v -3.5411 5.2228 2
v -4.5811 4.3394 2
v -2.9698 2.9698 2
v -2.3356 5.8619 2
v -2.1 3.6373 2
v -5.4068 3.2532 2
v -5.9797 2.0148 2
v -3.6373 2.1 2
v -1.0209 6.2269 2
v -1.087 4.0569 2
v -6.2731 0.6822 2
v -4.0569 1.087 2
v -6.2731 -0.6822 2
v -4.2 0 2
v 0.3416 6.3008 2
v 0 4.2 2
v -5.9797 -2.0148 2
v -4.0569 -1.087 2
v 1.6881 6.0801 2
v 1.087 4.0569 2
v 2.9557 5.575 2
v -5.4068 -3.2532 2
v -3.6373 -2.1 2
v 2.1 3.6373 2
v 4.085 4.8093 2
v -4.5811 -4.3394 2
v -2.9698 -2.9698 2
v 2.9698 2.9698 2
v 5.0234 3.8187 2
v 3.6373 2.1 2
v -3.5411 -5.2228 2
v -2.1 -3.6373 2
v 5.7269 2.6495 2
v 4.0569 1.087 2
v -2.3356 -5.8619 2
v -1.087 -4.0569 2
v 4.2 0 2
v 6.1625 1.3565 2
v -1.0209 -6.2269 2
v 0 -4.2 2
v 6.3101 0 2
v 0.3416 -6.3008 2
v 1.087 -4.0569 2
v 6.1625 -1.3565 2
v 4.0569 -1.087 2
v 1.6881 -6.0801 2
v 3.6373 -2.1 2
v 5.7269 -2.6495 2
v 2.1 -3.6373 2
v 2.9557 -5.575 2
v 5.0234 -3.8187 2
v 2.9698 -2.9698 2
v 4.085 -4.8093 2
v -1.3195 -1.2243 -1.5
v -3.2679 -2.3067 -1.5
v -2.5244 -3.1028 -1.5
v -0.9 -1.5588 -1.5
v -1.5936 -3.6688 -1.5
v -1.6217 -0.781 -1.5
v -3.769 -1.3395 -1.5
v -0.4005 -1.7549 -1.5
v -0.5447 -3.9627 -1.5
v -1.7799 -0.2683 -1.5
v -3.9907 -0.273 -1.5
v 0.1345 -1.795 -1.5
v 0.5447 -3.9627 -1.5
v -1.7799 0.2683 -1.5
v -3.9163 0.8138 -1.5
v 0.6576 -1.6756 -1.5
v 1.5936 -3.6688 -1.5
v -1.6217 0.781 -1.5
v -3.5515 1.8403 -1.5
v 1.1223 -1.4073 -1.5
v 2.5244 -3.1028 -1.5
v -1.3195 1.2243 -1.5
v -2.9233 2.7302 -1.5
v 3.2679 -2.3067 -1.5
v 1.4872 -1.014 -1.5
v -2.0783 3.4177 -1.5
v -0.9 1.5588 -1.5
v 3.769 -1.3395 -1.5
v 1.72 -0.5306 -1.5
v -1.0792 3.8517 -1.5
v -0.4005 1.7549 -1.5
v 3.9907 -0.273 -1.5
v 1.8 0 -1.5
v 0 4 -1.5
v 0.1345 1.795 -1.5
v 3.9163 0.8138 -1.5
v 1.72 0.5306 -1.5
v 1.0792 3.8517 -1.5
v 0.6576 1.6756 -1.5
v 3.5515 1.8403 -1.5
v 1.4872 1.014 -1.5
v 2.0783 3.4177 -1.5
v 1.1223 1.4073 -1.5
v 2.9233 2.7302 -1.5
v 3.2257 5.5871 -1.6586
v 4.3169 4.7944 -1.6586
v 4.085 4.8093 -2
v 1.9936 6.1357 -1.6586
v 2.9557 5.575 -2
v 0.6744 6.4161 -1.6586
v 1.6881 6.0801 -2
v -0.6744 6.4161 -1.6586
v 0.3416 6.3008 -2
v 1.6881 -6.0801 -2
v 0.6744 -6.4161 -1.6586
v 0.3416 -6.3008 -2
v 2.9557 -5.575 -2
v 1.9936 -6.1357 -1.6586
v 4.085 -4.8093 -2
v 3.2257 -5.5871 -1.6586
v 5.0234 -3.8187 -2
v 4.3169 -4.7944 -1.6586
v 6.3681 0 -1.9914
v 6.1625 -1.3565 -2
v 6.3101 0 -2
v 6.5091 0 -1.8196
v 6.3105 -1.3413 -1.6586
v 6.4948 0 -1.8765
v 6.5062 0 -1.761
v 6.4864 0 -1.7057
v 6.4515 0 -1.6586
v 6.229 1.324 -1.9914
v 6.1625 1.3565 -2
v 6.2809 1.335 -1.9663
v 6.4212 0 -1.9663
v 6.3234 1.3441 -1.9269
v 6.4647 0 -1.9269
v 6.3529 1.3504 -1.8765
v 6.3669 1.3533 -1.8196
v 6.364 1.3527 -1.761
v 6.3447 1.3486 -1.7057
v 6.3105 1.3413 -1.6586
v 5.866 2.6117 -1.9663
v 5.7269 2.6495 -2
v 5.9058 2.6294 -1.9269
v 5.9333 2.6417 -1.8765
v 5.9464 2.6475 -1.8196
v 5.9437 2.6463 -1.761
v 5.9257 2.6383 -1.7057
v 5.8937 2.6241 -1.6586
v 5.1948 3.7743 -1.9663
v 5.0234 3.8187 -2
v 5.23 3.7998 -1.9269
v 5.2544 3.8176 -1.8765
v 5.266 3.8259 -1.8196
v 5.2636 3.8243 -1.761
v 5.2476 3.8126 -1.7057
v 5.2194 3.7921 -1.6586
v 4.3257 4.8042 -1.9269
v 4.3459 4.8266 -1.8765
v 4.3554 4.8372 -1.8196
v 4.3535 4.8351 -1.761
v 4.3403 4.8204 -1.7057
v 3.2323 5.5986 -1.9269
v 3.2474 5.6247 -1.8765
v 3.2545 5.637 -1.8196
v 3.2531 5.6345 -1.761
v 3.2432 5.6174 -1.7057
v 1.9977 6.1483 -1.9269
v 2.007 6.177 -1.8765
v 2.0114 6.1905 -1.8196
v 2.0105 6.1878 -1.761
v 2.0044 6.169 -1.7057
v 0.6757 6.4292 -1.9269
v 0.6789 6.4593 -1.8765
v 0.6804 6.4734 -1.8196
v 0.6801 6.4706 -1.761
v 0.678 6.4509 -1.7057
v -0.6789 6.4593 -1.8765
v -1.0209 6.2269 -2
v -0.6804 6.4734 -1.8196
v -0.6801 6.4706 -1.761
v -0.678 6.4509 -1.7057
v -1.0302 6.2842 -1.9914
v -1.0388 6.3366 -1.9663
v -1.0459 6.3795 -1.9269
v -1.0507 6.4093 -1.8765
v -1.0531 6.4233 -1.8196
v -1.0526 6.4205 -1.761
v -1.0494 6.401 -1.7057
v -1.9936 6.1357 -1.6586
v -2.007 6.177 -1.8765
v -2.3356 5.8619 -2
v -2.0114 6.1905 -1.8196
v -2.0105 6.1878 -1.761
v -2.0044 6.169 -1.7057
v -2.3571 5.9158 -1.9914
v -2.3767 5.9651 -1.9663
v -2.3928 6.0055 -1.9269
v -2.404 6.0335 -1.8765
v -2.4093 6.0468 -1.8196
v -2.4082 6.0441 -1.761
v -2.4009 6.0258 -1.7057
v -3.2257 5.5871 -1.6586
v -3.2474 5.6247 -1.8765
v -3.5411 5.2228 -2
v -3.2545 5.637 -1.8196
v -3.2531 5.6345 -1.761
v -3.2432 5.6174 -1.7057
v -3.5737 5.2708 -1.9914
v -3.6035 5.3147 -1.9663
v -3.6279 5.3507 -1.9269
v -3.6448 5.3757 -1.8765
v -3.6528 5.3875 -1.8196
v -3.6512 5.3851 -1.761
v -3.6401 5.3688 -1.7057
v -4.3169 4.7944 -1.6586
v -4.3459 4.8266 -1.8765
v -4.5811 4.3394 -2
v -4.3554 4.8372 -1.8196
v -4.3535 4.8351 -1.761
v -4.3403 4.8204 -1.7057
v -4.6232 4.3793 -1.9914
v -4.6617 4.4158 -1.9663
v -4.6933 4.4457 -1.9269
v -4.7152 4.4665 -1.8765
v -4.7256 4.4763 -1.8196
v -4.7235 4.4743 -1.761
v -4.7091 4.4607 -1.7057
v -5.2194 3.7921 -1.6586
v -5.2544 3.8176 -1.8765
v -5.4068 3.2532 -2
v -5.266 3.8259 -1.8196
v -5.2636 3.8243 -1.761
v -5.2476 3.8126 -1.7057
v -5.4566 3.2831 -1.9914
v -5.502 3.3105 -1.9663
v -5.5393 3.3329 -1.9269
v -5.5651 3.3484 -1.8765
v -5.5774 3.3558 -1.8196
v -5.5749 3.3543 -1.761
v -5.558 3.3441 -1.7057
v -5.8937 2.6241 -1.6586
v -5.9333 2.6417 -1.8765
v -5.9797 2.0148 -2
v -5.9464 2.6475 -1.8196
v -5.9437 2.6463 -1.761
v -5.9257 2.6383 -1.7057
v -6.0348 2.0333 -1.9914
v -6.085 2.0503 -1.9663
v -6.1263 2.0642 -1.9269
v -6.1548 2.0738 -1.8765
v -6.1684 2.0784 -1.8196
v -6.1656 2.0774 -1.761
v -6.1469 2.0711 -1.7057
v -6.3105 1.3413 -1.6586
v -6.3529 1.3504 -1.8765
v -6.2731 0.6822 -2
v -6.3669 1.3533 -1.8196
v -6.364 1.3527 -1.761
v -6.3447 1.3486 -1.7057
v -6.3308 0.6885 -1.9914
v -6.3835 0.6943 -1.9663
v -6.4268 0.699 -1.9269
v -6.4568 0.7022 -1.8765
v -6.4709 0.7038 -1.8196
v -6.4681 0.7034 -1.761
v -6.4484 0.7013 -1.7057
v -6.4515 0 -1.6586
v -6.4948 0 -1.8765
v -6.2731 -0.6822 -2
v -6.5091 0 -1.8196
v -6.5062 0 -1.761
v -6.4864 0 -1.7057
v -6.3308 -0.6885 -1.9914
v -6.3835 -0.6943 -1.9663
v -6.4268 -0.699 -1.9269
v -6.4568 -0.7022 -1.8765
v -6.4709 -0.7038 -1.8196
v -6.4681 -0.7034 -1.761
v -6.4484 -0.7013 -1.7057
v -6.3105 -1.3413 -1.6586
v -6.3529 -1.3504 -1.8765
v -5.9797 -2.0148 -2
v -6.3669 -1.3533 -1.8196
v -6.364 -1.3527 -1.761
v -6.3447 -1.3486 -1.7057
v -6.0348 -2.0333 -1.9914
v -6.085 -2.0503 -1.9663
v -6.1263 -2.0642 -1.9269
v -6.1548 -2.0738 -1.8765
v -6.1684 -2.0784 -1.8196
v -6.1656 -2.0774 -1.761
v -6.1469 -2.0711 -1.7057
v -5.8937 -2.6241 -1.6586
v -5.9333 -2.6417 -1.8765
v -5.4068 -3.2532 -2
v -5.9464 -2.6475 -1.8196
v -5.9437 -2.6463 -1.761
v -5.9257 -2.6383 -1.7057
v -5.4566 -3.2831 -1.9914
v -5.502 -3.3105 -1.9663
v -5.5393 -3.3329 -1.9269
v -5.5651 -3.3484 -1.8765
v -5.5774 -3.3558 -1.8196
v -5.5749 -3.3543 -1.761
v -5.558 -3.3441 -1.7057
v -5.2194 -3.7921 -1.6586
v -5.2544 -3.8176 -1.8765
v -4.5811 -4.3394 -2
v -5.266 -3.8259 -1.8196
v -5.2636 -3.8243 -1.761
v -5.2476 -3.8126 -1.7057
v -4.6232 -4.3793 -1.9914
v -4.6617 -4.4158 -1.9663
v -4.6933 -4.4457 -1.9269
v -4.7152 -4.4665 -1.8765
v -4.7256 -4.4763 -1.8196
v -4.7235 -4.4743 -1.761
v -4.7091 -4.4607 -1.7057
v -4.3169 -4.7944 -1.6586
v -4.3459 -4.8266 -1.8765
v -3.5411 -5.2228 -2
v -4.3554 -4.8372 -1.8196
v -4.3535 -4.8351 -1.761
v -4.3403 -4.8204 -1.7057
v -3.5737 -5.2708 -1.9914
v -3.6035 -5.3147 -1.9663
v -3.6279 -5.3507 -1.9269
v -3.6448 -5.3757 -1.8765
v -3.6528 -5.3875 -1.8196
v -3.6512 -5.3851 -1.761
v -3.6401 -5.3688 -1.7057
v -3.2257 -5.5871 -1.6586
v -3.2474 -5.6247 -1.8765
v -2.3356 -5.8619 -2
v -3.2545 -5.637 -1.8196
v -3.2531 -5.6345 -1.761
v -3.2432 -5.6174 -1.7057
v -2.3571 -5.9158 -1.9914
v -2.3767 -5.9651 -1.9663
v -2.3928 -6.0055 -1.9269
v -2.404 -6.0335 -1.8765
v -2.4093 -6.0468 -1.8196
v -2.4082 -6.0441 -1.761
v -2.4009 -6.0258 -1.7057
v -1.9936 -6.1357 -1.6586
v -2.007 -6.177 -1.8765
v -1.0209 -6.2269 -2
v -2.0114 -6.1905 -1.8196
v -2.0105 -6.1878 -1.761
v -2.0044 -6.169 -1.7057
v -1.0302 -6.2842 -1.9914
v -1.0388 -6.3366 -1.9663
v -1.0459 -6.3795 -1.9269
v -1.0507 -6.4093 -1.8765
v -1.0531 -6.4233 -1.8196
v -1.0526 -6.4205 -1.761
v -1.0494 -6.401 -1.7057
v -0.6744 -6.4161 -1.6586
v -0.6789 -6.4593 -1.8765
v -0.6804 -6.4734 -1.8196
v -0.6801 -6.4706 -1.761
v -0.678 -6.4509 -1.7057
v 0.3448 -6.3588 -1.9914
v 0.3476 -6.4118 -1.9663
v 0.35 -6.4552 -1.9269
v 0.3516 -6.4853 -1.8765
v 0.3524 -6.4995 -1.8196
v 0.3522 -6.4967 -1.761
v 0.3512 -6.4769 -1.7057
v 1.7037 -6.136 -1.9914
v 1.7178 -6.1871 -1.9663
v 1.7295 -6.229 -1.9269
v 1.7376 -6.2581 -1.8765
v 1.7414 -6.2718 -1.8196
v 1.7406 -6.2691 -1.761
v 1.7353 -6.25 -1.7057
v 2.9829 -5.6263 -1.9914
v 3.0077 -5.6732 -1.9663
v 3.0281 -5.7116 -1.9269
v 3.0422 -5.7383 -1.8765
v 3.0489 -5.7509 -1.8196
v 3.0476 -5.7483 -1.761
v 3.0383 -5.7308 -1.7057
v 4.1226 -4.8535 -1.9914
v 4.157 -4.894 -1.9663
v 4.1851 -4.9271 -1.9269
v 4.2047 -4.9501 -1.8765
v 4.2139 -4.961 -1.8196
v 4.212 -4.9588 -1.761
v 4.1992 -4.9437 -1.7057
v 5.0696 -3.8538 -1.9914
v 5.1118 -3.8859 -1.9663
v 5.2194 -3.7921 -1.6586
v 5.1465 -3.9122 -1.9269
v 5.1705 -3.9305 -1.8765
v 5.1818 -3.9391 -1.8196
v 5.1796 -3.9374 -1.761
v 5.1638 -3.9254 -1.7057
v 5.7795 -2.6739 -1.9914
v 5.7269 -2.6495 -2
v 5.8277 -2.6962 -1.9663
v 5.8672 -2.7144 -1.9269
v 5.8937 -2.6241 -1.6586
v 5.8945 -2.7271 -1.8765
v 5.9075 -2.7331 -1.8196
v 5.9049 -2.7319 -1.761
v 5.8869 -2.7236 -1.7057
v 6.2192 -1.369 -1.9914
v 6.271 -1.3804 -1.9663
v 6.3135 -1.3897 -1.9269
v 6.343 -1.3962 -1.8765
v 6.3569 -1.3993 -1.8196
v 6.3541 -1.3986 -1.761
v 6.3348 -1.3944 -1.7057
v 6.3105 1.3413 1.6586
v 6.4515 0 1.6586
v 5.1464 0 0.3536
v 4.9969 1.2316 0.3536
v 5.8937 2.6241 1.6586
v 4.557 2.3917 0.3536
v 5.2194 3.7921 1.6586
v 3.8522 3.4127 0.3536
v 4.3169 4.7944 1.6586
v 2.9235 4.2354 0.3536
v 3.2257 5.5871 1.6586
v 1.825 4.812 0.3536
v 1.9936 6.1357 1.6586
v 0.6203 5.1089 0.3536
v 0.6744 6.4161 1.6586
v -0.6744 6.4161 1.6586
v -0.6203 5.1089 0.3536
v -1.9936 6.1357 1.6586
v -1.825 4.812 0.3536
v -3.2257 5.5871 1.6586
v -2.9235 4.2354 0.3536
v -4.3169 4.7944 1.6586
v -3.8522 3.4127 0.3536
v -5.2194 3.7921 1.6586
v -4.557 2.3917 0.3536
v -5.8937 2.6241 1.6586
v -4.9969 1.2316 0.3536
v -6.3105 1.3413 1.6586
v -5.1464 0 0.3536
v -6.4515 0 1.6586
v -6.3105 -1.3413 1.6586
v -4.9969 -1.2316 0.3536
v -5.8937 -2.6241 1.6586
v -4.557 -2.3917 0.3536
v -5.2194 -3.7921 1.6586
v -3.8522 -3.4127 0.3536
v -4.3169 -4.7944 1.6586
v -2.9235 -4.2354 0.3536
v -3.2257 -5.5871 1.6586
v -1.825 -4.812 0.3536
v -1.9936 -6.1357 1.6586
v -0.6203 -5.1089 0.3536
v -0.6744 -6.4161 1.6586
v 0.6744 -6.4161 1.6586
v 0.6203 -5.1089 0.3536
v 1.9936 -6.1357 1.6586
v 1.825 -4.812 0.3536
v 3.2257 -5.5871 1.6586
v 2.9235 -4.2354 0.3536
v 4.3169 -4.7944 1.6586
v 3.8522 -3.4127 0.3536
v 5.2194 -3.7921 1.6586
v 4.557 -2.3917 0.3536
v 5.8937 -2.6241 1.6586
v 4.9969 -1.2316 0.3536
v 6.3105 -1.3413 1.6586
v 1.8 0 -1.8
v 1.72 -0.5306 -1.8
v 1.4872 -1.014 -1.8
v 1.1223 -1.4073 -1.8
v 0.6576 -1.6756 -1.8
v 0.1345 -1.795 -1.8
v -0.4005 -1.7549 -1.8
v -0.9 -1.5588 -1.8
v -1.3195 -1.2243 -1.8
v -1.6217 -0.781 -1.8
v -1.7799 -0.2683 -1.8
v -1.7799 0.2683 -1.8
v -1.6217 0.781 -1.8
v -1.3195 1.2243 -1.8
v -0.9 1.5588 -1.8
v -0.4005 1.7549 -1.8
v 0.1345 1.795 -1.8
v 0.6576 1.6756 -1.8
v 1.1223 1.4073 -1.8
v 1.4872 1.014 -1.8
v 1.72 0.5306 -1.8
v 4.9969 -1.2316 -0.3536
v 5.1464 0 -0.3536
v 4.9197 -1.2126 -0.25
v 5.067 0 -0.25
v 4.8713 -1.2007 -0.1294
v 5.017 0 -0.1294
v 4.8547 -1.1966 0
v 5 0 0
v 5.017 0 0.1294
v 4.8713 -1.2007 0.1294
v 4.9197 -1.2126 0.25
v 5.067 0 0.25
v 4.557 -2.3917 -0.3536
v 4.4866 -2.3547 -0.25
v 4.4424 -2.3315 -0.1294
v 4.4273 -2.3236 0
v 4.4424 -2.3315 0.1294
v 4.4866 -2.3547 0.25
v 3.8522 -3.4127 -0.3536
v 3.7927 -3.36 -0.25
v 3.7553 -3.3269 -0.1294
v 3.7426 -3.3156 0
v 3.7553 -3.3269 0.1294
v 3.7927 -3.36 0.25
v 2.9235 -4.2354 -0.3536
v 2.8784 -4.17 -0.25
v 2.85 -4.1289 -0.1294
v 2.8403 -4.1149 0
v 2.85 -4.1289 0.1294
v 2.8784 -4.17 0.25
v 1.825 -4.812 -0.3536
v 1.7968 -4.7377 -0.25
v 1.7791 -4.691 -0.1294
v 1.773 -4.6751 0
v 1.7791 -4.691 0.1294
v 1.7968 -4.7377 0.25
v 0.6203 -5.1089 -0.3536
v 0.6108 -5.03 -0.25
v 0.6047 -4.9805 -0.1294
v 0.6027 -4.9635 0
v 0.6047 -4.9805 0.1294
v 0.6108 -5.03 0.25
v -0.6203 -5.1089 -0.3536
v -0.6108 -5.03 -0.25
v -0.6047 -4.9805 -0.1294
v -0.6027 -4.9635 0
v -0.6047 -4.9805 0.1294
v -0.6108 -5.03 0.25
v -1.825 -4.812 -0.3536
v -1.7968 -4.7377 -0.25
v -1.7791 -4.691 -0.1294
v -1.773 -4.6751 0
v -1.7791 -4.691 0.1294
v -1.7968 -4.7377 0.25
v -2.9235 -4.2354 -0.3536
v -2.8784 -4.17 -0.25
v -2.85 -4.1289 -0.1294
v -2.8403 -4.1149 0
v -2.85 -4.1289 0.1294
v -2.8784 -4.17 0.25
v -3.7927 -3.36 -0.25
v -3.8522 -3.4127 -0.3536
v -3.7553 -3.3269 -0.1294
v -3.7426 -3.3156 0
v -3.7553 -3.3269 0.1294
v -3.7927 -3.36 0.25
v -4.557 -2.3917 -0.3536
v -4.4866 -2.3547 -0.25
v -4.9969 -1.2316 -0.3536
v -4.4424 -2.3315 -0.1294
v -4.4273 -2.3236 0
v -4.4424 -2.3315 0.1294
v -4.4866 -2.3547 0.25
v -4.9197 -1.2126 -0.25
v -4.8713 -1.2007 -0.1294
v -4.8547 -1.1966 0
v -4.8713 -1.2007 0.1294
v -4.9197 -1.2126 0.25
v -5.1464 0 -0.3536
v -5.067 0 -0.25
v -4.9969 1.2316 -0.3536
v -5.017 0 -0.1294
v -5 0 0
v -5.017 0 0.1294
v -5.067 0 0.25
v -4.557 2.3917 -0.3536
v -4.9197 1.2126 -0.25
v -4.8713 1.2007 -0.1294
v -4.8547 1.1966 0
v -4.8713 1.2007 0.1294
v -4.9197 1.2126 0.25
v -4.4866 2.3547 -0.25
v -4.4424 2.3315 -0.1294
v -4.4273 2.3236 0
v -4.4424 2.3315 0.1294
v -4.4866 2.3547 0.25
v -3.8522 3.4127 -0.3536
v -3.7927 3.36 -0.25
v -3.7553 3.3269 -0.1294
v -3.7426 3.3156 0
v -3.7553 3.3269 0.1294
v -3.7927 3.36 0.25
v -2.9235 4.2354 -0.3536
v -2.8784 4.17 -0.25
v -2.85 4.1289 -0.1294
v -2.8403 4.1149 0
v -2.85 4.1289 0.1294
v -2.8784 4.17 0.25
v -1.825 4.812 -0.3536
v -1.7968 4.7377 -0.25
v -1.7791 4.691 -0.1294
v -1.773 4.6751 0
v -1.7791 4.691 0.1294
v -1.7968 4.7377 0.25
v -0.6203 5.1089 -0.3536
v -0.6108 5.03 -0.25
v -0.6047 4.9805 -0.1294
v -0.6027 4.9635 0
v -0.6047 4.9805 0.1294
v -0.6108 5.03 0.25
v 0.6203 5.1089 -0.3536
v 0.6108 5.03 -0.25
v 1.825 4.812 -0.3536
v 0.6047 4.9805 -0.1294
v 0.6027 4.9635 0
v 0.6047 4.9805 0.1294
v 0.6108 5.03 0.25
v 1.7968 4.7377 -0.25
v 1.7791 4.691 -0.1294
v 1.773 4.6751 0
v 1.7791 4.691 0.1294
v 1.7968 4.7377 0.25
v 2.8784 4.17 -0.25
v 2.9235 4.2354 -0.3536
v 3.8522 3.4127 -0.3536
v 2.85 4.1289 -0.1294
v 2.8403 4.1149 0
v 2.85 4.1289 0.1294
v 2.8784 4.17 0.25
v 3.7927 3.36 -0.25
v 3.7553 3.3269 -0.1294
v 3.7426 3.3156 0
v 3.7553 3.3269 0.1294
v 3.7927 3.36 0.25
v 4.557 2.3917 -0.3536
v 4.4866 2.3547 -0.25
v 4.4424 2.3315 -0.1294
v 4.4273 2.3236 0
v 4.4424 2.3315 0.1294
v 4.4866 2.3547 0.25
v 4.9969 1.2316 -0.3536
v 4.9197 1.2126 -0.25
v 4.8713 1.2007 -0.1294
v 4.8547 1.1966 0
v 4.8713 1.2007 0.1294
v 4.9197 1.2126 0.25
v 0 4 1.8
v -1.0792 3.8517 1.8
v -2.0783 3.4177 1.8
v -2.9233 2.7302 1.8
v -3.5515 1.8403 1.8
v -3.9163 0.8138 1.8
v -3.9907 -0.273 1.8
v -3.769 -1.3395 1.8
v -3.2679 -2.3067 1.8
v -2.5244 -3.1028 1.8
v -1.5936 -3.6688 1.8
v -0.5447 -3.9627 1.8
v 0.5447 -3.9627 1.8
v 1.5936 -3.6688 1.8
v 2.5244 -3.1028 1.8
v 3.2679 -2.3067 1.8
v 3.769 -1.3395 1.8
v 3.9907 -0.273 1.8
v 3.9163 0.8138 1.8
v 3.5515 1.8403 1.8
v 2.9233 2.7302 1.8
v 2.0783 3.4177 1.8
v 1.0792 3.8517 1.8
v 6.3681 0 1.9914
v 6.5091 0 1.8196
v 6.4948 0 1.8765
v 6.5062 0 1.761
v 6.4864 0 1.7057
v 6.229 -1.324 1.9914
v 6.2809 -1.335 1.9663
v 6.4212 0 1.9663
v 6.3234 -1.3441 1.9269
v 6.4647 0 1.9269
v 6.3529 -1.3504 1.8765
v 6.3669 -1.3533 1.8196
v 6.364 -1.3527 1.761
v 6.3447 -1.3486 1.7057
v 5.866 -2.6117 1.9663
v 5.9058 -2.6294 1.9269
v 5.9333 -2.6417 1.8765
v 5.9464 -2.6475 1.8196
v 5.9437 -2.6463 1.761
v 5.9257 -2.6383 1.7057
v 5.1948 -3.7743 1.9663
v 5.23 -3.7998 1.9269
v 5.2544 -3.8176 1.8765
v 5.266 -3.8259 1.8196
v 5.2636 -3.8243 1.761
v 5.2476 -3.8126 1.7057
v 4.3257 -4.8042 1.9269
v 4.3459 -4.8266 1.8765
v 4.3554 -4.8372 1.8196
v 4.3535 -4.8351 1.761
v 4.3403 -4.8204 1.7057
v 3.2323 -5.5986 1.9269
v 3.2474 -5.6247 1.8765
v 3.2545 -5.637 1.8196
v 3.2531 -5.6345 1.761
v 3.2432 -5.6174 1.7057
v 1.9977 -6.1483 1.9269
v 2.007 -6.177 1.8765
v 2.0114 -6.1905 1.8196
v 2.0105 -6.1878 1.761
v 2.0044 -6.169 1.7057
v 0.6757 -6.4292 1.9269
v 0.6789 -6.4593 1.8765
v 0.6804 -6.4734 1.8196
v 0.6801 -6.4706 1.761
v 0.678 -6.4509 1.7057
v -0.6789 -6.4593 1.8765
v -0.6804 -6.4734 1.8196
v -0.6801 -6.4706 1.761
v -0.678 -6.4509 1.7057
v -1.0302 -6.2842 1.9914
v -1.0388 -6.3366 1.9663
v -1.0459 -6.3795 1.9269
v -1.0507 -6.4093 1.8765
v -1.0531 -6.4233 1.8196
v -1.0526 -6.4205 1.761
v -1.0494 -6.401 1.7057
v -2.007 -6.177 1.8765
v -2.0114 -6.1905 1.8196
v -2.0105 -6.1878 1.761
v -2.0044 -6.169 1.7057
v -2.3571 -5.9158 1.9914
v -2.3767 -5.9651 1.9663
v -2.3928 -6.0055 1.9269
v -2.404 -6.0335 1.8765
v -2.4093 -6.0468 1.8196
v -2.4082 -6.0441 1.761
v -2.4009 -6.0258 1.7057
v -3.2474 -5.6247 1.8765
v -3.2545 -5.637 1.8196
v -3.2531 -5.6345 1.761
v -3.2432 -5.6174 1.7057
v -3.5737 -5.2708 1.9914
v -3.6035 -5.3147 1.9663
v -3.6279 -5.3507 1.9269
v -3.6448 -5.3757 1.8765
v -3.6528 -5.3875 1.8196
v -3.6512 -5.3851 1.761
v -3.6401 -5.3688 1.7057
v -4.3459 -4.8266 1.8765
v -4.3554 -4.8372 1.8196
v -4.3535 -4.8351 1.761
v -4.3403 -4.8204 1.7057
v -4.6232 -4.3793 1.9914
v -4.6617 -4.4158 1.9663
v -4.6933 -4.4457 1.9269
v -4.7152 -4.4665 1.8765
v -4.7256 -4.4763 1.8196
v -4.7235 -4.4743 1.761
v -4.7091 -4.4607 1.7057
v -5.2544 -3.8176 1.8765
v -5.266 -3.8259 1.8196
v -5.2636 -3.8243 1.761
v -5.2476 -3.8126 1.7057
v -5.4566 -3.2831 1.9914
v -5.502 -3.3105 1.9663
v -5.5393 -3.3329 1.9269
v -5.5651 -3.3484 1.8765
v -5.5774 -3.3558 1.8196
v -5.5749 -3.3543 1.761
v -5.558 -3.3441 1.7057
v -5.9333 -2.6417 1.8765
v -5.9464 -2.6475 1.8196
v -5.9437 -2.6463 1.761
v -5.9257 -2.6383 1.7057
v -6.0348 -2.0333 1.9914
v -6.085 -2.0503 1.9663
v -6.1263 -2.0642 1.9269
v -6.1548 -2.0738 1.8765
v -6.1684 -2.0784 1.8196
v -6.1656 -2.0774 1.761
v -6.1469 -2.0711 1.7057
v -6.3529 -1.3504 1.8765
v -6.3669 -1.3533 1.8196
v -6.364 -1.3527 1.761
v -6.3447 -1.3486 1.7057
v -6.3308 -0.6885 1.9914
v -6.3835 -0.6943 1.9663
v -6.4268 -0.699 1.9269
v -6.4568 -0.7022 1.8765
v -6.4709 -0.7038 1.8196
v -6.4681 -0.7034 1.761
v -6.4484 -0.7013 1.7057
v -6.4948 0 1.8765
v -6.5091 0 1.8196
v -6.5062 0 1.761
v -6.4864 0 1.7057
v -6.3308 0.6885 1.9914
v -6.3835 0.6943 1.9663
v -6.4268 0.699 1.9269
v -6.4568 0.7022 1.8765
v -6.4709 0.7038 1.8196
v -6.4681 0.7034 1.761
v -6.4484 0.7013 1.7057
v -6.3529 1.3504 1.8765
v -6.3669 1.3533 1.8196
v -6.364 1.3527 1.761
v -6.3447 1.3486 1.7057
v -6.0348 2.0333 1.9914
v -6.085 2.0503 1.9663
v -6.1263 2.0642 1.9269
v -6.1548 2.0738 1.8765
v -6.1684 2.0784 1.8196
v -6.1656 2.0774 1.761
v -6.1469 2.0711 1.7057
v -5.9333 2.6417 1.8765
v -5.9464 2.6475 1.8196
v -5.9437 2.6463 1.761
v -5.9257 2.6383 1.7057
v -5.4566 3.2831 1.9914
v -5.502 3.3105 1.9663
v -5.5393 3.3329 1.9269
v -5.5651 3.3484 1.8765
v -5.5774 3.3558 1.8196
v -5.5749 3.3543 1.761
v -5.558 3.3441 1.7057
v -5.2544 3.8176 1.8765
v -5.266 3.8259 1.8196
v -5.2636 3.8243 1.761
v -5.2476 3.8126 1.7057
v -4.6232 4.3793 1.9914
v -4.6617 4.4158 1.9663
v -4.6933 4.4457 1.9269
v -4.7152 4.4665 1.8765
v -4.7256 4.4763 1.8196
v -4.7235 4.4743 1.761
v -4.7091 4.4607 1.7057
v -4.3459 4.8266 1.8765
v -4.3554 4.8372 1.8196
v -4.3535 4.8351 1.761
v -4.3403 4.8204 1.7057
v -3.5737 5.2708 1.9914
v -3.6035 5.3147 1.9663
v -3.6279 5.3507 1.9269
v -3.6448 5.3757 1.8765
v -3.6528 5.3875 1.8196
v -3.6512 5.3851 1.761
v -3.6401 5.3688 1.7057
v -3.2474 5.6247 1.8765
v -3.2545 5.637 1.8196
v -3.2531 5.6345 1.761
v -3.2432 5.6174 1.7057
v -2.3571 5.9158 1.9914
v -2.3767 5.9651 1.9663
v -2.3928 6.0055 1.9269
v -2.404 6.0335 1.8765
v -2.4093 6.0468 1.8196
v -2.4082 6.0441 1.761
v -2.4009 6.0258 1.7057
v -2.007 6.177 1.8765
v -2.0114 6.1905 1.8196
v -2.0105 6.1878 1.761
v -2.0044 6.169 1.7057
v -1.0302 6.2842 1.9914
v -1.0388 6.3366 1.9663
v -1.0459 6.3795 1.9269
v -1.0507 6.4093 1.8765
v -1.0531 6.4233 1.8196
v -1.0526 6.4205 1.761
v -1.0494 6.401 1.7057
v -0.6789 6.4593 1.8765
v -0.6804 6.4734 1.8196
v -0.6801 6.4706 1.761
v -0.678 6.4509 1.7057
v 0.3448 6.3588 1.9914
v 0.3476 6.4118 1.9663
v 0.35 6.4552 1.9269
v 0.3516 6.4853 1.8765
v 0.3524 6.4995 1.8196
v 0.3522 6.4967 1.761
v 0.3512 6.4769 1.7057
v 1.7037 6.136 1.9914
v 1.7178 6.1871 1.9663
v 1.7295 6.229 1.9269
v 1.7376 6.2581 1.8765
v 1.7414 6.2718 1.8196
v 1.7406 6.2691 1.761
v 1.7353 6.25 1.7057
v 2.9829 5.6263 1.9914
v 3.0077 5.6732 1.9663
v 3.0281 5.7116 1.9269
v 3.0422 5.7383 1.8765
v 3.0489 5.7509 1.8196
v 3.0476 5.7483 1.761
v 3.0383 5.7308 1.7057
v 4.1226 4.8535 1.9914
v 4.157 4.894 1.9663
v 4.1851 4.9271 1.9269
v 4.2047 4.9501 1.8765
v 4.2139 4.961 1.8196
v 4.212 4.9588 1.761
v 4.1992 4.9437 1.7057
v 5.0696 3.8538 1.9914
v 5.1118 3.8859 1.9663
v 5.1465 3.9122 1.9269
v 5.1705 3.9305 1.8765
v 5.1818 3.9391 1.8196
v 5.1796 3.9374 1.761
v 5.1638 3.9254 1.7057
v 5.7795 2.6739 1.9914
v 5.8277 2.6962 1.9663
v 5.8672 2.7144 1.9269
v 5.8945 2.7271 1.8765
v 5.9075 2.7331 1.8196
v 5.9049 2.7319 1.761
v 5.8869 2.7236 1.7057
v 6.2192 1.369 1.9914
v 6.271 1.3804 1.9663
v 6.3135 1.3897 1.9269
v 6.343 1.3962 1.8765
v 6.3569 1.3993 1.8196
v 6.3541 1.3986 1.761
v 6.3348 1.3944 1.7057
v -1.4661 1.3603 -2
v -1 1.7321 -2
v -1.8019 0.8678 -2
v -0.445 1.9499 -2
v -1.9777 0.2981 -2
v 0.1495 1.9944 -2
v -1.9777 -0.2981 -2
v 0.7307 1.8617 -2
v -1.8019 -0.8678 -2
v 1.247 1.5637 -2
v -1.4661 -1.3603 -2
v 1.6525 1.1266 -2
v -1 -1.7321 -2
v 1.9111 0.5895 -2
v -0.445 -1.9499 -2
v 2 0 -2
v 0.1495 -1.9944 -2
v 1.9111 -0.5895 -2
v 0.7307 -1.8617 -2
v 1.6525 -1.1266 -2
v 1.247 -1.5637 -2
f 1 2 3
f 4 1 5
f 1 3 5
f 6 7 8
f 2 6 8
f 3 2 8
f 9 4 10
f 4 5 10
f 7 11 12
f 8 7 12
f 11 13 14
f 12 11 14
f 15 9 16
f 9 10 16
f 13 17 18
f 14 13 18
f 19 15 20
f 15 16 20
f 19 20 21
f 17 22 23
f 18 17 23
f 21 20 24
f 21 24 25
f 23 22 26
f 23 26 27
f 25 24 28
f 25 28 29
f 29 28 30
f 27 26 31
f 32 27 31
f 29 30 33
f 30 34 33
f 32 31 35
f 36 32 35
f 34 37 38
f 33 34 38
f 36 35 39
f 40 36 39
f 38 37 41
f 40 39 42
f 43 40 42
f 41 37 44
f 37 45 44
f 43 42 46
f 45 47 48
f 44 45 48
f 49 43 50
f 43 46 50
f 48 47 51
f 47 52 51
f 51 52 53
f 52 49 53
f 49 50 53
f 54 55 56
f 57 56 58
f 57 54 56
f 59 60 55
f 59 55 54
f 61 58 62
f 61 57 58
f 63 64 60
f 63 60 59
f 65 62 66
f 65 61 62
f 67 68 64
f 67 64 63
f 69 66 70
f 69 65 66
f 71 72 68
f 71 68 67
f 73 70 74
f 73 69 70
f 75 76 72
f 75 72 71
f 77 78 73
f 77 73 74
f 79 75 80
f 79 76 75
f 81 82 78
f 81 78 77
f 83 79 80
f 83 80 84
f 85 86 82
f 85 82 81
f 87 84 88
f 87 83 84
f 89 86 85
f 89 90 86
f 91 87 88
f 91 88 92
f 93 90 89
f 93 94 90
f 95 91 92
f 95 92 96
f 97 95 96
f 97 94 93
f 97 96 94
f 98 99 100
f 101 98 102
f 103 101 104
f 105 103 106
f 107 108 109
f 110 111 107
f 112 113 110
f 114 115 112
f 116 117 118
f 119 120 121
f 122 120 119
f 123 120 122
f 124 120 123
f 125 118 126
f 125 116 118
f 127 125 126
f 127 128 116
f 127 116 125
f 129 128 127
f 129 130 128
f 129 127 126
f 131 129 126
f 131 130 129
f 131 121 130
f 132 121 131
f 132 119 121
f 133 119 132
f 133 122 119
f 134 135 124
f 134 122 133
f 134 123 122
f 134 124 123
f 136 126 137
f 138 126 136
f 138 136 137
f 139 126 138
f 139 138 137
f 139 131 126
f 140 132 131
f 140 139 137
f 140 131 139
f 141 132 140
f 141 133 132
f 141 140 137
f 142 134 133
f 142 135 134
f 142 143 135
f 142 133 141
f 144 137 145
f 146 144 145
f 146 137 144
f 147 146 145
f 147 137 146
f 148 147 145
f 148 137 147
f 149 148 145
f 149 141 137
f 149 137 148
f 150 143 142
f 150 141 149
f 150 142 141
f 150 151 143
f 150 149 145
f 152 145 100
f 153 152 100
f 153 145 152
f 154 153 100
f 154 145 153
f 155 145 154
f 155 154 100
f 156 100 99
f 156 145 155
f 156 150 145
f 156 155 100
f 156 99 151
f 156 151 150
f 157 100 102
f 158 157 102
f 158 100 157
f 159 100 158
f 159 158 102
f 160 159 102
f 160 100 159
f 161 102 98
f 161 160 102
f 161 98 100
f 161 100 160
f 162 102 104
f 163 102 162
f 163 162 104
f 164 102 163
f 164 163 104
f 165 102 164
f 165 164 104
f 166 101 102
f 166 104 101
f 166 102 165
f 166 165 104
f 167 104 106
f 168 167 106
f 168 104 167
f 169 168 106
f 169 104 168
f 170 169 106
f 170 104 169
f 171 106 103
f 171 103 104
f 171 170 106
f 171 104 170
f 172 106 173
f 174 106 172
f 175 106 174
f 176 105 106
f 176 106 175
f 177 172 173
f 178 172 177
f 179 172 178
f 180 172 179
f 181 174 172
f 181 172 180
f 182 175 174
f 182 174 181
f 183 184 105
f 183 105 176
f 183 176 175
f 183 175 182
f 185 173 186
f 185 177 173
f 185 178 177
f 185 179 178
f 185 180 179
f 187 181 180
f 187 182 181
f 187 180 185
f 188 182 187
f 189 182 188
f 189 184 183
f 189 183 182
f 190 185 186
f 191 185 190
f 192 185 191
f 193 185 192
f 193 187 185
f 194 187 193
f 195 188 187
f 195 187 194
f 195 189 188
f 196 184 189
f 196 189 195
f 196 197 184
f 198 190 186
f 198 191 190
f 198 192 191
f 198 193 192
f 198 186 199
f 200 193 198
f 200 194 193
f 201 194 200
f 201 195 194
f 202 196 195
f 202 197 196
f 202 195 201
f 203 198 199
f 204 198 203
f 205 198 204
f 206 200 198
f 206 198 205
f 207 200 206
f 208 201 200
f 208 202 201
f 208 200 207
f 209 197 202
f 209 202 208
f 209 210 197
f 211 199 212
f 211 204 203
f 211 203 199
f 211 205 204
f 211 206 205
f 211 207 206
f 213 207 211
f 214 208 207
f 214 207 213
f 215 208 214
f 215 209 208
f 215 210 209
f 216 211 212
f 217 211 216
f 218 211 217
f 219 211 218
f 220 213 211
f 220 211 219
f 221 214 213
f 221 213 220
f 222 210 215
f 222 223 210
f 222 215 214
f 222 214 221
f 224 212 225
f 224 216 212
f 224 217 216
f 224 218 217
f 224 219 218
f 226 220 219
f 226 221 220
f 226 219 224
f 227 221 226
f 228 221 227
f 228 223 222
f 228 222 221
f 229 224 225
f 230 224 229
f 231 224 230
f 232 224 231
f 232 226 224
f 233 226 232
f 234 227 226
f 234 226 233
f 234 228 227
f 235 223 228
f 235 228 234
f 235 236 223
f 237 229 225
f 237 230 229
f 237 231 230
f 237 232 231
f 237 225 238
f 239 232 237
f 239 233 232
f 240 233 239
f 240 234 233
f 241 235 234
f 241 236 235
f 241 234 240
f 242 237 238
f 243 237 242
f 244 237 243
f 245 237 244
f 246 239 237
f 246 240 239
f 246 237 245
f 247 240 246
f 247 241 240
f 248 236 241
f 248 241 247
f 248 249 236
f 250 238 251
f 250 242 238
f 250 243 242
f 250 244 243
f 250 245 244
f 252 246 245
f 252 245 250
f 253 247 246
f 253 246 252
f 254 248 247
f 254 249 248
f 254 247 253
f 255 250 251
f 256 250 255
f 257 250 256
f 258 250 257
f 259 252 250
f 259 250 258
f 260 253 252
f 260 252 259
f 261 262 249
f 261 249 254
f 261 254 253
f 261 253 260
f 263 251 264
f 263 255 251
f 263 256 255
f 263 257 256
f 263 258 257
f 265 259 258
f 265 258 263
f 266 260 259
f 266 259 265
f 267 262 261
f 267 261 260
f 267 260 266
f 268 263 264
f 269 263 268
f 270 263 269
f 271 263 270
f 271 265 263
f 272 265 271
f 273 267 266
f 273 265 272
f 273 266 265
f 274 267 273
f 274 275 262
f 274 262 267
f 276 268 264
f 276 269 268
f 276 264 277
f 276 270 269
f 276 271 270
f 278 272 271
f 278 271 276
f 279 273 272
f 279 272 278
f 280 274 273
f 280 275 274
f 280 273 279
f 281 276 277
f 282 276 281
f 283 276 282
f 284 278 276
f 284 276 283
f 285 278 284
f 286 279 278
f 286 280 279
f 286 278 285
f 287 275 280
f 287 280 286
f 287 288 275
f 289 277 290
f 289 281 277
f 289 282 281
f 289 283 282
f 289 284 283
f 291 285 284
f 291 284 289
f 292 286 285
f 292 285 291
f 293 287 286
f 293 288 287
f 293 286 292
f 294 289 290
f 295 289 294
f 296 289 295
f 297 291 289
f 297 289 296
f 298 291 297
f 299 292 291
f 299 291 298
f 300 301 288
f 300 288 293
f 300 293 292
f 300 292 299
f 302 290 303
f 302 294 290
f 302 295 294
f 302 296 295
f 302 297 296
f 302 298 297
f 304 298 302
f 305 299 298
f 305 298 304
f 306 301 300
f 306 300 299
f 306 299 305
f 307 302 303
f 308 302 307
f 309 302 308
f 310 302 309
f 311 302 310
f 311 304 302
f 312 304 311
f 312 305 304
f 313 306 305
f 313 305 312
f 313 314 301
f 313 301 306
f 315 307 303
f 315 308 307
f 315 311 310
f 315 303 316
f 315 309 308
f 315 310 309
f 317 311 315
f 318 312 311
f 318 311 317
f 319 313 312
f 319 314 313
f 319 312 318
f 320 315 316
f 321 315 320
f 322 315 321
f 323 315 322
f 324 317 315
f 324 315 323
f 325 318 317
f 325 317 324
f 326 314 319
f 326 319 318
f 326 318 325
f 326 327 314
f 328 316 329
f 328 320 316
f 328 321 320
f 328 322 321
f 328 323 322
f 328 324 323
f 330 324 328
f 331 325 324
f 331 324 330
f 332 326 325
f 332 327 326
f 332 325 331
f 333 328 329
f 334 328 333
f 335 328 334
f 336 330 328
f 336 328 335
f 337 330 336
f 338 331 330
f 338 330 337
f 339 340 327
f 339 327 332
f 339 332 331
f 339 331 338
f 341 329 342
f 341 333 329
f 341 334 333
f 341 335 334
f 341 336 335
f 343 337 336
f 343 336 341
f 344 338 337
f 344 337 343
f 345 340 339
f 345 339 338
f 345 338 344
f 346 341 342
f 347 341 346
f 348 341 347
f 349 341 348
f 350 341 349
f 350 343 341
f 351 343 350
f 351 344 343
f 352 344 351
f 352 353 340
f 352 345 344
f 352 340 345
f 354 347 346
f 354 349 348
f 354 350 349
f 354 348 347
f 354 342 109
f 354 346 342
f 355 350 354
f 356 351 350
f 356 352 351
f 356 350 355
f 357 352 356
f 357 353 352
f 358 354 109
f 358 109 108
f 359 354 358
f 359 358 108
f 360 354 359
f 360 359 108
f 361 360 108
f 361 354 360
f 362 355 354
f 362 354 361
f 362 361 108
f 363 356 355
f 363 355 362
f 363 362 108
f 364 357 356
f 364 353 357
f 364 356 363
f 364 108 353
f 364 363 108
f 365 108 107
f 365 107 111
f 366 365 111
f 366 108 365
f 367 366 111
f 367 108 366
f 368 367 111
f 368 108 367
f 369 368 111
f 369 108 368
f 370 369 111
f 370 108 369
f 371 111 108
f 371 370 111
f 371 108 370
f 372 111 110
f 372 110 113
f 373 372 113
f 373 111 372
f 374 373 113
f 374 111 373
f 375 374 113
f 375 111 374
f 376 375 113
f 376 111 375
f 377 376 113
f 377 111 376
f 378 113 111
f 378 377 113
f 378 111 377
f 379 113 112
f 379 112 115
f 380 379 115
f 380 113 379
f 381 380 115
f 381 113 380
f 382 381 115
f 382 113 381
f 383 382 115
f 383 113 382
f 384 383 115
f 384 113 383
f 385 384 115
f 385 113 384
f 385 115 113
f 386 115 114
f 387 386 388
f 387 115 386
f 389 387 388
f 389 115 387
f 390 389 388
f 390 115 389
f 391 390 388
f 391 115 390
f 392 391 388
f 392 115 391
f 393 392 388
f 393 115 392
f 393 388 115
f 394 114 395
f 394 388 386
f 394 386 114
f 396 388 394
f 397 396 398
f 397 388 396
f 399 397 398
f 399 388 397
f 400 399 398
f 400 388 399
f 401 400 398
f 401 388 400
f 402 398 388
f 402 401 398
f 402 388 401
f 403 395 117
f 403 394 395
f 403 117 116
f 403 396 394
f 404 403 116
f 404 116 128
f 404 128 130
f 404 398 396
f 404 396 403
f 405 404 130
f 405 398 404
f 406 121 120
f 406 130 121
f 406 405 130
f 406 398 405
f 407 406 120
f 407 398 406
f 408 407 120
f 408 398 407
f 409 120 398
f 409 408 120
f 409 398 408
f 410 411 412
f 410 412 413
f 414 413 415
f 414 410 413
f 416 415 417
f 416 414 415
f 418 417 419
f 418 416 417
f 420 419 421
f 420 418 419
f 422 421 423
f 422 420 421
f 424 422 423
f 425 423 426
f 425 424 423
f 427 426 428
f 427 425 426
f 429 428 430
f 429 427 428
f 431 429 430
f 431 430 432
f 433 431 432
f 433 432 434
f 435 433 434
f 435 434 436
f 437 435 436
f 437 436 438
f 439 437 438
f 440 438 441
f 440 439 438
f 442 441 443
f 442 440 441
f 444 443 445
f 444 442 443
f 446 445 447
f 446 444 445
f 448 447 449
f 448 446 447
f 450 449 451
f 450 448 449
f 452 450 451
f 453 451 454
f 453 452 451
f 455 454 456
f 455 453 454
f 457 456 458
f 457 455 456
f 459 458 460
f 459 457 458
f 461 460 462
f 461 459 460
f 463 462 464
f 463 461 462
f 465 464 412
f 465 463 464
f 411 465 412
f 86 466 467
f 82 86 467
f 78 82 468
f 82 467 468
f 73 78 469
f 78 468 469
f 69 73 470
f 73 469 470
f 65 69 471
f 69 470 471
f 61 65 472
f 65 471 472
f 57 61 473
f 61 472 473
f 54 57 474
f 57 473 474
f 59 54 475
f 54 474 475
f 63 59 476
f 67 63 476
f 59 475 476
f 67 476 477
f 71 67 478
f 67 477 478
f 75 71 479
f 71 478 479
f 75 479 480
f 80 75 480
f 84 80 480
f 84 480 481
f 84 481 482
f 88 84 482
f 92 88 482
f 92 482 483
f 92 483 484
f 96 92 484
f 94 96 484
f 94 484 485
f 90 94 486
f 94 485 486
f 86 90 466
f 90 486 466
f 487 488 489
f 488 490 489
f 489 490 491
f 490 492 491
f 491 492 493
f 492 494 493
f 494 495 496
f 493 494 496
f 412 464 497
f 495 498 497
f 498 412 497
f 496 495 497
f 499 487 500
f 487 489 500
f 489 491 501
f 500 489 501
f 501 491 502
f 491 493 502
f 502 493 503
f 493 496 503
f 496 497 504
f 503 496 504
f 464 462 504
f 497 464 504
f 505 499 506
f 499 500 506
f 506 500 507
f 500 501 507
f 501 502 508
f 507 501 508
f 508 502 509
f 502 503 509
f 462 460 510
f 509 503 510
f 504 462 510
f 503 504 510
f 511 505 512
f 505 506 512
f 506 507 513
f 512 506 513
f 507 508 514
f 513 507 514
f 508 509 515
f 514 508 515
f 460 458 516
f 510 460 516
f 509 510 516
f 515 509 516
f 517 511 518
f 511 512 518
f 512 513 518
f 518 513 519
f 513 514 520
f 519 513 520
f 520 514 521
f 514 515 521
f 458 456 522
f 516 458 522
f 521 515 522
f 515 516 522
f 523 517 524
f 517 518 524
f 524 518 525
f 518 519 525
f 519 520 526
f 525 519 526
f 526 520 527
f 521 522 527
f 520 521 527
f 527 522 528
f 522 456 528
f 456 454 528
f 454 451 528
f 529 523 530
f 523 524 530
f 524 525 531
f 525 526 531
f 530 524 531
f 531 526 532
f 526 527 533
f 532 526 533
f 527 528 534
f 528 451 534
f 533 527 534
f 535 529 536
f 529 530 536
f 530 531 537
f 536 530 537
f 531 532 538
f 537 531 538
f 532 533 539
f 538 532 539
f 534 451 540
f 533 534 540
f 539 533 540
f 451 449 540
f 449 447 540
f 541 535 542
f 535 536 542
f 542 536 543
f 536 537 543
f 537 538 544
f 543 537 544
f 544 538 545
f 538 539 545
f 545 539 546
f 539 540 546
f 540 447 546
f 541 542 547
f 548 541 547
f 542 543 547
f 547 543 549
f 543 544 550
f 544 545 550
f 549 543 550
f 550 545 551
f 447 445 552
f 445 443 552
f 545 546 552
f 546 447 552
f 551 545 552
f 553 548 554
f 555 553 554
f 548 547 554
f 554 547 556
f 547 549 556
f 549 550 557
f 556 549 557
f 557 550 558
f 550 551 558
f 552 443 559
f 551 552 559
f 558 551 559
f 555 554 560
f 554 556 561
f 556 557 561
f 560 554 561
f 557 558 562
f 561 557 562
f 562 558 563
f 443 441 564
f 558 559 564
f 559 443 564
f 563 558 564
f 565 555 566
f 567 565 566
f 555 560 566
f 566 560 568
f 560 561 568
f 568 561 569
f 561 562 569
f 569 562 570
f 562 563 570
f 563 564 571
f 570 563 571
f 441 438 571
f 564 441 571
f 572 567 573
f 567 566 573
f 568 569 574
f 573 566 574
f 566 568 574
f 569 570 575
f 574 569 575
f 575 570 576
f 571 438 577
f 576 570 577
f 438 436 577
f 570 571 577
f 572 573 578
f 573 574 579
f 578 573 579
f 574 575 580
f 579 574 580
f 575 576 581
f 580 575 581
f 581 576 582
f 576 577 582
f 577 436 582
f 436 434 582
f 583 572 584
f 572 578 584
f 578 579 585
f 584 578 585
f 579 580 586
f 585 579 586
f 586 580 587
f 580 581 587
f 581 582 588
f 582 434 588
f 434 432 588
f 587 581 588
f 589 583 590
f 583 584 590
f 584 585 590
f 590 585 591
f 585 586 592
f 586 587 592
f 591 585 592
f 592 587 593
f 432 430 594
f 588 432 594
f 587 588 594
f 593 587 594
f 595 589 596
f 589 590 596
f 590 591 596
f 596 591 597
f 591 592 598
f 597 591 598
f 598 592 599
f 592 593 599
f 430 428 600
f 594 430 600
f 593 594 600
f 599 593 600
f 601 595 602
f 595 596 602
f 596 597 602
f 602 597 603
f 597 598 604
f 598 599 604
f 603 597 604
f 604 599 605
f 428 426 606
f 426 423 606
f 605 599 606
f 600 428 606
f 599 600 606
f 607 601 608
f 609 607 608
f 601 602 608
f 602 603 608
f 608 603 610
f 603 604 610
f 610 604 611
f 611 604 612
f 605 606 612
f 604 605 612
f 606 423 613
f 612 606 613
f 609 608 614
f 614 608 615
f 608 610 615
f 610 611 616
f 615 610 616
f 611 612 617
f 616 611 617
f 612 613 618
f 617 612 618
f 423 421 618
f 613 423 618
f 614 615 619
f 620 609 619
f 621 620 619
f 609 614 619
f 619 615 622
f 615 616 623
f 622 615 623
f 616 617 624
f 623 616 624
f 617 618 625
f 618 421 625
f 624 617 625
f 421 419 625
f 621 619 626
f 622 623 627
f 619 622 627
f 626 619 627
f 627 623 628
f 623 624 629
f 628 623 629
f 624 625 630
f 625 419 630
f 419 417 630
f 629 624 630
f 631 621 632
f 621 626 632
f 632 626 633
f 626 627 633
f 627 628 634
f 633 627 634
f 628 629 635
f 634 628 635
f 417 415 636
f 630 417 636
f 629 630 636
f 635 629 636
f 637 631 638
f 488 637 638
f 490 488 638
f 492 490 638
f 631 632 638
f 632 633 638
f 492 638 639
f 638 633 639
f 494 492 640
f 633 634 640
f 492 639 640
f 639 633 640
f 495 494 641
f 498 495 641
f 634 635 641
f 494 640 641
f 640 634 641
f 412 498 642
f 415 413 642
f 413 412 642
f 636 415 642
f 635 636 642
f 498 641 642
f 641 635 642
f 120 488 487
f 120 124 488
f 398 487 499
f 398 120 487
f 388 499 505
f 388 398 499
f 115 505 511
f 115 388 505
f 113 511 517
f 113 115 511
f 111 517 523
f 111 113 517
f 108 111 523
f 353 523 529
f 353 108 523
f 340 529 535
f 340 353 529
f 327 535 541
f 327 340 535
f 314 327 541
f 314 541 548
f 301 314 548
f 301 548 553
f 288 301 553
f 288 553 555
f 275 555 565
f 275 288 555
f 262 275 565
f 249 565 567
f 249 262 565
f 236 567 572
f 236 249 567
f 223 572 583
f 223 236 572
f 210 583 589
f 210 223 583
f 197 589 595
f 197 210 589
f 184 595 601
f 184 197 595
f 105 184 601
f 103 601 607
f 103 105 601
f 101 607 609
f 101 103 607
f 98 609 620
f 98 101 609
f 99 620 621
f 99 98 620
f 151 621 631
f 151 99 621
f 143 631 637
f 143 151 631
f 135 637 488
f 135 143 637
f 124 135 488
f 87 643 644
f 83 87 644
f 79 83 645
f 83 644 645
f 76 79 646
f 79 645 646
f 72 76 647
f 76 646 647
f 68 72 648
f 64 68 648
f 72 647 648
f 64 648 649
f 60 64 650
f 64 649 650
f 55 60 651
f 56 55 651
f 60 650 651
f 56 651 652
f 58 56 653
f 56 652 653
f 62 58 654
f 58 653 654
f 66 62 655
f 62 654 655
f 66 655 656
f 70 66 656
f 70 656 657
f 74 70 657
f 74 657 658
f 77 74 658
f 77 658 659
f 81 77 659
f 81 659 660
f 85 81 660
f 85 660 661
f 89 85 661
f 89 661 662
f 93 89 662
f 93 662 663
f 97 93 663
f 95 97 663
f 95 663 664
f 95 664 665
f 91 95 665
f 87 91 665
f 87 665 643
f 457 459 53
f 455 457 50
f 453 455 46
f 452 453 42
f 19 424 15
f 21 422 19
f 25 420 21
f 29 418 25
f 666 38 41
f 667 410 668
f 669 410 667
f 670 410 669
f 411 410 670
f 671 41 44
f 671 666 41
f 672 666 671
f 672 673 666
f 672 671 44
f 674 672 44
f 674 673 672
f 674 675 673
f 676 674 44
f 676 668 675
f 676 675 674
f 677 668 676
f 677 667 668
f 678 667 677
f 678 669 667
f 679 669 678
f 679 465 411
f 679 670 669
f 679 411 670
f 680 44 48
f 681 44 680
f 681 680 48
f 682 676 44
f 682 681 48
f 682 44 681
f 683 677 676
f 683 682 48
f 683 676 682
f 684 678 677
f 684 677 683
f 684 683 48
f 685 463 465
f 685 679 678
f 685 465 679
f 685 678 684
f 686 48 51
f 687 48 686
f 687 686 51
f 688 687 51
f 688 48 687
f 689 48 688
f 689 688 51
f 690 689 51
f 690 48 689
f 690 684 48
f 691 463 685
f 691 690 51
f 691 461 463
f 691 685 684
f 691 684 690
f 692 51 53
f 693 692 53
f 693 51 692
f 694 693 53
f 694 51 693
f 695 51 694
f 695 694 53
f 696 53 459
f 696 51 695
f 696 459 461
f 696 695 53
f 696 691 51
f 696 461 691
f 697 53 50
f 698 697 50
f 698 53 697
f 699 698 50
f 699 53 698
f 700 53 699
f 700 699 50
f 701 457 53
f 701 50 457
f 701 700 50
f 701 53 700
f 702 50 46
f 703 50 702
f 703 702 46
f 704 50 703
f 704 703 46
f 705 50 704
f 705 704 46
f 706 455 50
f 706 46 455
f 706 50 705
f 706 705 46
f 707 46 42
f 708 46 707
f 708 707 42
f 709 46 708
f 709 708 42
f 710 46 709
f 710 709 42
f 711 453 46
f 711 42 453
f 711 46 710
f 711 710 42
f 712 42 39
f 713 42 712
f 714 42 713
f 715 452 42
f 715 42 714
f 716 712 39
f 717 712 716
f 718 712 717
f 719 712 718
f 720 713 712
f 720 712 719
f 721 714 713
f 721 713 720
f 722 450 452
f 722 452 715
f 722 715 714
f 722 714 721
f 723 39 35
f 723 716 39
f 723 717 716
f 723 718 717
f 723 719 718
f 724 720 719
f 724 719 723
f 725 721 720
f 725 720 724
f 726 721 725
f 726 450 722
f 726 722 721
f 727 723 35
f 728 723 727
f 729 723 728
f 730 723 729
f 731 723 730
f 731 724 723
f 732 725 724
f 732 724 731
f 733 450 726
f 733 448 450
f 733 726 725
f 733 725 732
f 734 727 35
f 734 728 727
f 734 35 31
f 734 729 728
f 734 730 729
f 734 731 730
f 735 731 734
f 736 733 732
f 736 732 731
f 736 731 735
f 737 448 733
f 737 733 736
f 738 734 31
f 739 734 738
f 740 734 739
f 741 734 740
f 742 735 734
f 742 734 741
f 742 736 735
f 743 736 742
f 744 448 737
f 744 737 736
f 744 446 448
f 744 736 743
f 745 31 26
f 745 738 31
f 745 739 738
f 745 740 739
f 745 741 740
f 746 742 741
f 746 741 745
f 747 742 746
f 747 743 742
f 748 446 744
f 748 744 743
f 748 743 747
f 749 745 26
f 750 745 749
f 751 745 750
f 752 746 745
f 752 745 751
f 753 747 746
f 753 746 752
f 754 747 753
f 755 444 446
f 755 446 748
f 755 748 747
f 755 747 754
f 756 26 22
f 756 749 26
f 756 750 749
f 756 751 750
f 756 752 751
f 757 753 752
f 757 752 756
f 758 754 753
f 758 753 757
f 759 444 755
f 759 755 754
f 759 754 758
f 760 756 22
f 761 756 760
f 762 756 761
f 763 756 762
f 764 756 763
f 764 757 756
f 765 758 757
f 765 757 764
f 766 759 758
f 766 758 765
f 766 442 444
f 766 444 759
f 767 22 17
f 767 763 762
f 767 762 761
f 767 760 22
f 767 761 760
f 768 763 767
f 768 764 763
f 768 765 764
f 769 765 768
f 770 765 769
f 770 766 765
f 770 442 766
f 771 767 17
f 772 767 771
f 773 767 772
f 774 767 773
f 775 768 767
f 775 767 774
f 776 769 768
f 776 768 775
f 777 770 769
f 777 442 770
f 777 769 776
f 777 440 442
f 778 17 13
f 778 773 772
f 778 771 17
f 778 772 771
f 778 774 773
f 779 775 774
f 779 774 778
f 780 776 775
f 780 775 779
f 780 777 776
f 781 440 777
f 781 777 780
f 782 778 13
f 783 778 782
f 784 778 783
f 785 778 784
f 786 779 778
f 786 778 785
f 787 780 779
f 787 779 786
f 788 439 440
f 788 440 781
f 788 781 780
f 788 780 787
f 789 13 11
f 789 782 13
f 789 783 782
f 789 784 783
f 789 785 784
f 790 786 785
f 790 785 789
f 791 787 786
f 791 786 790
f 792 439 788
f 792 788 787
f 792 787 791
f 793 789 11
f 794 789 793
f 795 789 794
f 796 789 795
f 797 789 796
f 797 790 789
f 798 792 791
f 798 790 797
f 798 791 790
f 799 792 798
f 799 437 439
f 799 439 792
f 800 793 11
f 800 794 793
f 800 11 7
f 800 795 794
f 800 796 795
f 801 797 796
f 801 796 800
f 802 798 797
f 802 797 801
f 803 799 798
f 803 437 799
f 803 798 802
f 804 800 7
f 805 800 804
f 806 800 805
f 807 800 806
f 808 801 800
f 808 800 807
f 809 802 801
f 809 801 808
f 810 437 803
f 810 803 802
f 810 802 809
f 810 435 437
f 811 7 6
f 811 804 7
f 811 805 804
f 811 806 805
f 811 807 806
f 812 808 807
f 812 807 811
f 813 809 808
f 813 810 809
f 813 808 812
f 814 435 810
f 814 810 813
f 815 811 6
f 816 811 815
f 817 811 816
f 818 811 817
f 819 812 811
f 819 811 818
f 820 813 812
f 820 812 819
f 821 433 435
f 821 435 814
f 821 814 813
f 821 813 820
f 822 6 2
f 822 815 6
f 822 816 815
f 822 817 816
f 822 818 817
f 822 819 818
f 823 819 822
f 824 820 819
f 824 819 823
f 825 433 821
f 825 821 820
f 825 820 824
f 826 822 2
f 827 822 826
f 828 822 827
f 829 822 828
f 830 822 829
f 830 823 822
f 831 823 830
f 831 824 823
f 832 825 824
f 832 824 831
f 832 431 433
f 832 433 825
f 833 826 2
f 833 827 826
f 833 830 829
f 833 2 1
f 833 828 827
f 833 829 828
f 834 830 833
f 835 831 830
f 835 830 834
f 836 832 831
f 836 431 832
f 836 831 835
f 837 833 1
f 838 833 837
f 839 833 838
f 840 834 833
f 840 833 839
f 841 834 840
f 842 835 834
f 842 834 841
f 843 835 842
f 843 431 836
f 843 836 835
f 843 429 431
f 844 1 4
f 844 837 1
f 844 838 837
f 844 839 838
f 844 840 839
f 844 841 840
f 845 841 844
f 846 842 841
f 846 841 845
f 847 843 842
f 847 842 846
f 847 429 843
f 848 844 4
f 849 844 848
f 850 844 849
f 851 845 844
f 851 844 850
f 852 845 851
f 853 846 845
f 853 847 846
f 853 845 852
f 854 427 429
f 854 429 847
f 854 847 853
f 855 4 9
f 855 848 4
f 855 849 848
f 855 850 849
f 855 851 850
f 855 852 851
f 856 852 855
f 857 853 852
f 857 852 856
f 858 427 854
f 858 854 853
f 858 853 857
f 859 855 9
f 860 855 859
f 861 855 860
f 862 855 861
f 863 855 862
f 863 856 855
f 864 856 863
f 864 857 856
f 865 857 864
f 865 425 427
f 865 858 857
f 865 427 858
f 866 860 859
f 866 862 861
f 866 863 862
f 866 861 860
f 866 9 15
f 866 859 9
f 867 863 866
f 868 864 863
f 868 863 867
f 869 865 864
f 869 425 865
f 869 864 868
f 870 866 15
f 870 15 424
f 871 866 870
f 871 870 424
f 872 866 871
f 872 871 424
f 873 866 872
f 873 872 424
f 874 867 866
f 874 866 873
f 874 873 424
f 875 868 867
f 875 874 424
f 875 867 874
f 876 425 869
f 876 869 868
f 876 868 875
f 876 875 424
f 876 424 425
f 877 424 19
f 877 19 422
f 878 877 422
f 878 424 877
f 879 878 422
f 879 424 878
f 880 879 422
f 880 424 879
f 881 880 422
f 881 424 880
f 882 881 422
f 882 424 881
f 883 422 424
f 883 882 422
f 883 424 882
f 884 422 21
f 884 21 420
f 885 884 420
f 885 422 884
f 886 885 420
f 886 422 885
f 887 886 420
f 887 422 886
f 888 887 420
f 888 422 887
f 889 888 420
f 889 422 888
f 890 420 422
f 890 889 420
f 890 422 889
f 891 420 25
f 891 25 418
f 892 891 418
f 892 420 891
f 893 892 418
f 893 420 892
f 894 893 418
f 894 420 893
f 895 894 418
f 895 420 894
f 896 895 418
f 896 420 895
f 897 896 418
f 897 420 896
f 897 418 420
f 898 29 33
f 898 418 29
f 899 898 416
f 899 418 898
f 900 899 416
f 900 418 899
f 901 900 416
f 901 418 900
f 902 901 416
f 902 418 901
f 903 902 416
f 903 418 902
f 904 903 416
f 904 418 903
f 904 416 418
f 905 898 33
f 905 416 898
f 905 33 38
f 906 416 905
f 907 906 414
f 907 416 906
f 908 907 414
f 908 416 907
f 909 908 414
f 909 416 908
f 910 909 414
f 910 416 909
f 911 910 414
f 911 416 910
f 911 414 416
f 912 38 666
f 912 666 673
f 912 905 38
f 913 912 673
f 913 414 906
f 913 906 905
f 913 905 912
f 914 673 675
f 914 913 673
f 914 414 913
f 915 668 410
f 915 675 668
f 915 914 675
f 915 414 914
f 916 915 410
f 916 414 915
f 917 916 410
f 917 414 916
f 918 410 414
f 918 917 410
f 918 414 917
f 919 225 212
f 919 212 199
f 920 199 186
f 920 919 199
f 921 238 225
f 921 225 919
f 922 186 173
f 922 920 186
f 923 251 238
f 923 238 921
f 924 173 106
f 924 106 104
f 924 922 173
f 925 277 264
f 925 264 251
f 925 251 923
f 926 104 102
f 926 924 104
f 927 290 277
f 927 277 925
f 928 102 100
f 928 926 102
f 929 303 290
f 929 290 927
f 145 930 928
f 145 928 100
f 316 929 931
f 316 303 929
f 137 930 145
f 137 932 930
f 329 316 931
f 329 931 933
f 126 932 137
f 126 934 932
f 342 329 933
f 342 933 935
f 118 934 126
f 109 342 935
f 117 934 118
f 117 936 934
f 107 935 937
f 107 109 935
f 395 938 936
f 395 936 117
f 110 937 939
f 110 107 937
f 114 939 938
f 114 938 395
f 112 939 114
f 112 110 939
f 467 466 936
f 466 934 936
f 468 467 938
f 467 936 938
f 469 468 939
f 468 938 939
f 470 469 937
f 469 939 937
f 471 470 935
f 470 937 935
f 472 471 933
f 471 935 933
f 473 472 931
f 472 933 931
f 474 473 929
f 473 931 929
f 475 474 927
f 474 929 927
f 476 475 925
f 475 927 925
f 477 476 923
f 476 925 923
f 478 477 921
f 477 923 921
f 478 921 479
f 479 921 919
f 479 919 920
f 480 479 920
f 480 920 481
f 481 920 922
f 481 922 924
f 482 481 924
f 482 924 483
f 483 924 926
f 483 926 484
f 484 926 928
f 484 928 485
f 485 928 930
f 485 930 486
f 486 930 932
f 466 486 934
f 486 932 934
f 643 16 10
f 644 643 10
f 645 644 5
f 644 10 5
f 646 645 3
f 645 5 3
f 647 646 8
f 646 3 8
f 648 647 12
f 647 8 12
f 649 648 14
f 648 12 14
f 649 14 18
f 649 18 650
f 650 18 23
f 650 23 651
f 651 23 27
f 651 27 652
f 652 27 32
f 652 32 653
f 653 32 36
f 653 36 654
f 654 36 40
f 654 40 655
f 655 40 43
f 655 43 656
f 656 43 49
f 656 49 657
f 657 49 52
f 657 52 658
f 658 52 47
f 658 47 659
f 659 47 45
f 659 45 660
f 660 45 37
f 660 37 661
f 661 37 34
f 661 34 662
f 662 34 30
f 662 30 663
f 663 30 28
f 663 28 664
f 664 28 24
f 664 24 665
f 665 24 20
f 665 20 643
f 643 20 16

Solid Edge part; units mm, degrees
sketch "Sketch1" plane through (0, 0, 0) normal (0, -1, 0) x (1, 0, 0)
  line L0 (6.7929, 2) -> (1.8, 2)
  line L1 (1.8, 2) -> (1.8, -2)
  line L2 (1.8, -2) -> (6.7929, -2)
  line L3 (6.7929, -2) -> (5.1464, -0.3536)
  line L4 (5.1464, 0.3536) -> (6.7929, 2)
  arc A0 (5.1464, -0.3536) -> (5.1464, 0.3536) centre (5.5, 0) cw
revolve "RevolvedProtrusion1" add sketch "Sketch1" angle 360 about axis through (0, 0, 2) along (0, 0, -1)
fillet "Round1" radius 0.2 2 edges at (-6.7929, 0, 2) (-6.7929, 0, -2)
sketch "Sketch2" plane through (0, 0, 2) normal (0, 0, 1) x (0, 1, 0)
  circle A0 centre (0, 0) radius 4
extrude "VaciadoExtruido_2" cut sketch "Sketch2" against normal blind 3.5
chamfer "Chaflán_1" distance 0.2 angle 45 2 edges at (0, -4, 2) (-1.8, 0, -2)
